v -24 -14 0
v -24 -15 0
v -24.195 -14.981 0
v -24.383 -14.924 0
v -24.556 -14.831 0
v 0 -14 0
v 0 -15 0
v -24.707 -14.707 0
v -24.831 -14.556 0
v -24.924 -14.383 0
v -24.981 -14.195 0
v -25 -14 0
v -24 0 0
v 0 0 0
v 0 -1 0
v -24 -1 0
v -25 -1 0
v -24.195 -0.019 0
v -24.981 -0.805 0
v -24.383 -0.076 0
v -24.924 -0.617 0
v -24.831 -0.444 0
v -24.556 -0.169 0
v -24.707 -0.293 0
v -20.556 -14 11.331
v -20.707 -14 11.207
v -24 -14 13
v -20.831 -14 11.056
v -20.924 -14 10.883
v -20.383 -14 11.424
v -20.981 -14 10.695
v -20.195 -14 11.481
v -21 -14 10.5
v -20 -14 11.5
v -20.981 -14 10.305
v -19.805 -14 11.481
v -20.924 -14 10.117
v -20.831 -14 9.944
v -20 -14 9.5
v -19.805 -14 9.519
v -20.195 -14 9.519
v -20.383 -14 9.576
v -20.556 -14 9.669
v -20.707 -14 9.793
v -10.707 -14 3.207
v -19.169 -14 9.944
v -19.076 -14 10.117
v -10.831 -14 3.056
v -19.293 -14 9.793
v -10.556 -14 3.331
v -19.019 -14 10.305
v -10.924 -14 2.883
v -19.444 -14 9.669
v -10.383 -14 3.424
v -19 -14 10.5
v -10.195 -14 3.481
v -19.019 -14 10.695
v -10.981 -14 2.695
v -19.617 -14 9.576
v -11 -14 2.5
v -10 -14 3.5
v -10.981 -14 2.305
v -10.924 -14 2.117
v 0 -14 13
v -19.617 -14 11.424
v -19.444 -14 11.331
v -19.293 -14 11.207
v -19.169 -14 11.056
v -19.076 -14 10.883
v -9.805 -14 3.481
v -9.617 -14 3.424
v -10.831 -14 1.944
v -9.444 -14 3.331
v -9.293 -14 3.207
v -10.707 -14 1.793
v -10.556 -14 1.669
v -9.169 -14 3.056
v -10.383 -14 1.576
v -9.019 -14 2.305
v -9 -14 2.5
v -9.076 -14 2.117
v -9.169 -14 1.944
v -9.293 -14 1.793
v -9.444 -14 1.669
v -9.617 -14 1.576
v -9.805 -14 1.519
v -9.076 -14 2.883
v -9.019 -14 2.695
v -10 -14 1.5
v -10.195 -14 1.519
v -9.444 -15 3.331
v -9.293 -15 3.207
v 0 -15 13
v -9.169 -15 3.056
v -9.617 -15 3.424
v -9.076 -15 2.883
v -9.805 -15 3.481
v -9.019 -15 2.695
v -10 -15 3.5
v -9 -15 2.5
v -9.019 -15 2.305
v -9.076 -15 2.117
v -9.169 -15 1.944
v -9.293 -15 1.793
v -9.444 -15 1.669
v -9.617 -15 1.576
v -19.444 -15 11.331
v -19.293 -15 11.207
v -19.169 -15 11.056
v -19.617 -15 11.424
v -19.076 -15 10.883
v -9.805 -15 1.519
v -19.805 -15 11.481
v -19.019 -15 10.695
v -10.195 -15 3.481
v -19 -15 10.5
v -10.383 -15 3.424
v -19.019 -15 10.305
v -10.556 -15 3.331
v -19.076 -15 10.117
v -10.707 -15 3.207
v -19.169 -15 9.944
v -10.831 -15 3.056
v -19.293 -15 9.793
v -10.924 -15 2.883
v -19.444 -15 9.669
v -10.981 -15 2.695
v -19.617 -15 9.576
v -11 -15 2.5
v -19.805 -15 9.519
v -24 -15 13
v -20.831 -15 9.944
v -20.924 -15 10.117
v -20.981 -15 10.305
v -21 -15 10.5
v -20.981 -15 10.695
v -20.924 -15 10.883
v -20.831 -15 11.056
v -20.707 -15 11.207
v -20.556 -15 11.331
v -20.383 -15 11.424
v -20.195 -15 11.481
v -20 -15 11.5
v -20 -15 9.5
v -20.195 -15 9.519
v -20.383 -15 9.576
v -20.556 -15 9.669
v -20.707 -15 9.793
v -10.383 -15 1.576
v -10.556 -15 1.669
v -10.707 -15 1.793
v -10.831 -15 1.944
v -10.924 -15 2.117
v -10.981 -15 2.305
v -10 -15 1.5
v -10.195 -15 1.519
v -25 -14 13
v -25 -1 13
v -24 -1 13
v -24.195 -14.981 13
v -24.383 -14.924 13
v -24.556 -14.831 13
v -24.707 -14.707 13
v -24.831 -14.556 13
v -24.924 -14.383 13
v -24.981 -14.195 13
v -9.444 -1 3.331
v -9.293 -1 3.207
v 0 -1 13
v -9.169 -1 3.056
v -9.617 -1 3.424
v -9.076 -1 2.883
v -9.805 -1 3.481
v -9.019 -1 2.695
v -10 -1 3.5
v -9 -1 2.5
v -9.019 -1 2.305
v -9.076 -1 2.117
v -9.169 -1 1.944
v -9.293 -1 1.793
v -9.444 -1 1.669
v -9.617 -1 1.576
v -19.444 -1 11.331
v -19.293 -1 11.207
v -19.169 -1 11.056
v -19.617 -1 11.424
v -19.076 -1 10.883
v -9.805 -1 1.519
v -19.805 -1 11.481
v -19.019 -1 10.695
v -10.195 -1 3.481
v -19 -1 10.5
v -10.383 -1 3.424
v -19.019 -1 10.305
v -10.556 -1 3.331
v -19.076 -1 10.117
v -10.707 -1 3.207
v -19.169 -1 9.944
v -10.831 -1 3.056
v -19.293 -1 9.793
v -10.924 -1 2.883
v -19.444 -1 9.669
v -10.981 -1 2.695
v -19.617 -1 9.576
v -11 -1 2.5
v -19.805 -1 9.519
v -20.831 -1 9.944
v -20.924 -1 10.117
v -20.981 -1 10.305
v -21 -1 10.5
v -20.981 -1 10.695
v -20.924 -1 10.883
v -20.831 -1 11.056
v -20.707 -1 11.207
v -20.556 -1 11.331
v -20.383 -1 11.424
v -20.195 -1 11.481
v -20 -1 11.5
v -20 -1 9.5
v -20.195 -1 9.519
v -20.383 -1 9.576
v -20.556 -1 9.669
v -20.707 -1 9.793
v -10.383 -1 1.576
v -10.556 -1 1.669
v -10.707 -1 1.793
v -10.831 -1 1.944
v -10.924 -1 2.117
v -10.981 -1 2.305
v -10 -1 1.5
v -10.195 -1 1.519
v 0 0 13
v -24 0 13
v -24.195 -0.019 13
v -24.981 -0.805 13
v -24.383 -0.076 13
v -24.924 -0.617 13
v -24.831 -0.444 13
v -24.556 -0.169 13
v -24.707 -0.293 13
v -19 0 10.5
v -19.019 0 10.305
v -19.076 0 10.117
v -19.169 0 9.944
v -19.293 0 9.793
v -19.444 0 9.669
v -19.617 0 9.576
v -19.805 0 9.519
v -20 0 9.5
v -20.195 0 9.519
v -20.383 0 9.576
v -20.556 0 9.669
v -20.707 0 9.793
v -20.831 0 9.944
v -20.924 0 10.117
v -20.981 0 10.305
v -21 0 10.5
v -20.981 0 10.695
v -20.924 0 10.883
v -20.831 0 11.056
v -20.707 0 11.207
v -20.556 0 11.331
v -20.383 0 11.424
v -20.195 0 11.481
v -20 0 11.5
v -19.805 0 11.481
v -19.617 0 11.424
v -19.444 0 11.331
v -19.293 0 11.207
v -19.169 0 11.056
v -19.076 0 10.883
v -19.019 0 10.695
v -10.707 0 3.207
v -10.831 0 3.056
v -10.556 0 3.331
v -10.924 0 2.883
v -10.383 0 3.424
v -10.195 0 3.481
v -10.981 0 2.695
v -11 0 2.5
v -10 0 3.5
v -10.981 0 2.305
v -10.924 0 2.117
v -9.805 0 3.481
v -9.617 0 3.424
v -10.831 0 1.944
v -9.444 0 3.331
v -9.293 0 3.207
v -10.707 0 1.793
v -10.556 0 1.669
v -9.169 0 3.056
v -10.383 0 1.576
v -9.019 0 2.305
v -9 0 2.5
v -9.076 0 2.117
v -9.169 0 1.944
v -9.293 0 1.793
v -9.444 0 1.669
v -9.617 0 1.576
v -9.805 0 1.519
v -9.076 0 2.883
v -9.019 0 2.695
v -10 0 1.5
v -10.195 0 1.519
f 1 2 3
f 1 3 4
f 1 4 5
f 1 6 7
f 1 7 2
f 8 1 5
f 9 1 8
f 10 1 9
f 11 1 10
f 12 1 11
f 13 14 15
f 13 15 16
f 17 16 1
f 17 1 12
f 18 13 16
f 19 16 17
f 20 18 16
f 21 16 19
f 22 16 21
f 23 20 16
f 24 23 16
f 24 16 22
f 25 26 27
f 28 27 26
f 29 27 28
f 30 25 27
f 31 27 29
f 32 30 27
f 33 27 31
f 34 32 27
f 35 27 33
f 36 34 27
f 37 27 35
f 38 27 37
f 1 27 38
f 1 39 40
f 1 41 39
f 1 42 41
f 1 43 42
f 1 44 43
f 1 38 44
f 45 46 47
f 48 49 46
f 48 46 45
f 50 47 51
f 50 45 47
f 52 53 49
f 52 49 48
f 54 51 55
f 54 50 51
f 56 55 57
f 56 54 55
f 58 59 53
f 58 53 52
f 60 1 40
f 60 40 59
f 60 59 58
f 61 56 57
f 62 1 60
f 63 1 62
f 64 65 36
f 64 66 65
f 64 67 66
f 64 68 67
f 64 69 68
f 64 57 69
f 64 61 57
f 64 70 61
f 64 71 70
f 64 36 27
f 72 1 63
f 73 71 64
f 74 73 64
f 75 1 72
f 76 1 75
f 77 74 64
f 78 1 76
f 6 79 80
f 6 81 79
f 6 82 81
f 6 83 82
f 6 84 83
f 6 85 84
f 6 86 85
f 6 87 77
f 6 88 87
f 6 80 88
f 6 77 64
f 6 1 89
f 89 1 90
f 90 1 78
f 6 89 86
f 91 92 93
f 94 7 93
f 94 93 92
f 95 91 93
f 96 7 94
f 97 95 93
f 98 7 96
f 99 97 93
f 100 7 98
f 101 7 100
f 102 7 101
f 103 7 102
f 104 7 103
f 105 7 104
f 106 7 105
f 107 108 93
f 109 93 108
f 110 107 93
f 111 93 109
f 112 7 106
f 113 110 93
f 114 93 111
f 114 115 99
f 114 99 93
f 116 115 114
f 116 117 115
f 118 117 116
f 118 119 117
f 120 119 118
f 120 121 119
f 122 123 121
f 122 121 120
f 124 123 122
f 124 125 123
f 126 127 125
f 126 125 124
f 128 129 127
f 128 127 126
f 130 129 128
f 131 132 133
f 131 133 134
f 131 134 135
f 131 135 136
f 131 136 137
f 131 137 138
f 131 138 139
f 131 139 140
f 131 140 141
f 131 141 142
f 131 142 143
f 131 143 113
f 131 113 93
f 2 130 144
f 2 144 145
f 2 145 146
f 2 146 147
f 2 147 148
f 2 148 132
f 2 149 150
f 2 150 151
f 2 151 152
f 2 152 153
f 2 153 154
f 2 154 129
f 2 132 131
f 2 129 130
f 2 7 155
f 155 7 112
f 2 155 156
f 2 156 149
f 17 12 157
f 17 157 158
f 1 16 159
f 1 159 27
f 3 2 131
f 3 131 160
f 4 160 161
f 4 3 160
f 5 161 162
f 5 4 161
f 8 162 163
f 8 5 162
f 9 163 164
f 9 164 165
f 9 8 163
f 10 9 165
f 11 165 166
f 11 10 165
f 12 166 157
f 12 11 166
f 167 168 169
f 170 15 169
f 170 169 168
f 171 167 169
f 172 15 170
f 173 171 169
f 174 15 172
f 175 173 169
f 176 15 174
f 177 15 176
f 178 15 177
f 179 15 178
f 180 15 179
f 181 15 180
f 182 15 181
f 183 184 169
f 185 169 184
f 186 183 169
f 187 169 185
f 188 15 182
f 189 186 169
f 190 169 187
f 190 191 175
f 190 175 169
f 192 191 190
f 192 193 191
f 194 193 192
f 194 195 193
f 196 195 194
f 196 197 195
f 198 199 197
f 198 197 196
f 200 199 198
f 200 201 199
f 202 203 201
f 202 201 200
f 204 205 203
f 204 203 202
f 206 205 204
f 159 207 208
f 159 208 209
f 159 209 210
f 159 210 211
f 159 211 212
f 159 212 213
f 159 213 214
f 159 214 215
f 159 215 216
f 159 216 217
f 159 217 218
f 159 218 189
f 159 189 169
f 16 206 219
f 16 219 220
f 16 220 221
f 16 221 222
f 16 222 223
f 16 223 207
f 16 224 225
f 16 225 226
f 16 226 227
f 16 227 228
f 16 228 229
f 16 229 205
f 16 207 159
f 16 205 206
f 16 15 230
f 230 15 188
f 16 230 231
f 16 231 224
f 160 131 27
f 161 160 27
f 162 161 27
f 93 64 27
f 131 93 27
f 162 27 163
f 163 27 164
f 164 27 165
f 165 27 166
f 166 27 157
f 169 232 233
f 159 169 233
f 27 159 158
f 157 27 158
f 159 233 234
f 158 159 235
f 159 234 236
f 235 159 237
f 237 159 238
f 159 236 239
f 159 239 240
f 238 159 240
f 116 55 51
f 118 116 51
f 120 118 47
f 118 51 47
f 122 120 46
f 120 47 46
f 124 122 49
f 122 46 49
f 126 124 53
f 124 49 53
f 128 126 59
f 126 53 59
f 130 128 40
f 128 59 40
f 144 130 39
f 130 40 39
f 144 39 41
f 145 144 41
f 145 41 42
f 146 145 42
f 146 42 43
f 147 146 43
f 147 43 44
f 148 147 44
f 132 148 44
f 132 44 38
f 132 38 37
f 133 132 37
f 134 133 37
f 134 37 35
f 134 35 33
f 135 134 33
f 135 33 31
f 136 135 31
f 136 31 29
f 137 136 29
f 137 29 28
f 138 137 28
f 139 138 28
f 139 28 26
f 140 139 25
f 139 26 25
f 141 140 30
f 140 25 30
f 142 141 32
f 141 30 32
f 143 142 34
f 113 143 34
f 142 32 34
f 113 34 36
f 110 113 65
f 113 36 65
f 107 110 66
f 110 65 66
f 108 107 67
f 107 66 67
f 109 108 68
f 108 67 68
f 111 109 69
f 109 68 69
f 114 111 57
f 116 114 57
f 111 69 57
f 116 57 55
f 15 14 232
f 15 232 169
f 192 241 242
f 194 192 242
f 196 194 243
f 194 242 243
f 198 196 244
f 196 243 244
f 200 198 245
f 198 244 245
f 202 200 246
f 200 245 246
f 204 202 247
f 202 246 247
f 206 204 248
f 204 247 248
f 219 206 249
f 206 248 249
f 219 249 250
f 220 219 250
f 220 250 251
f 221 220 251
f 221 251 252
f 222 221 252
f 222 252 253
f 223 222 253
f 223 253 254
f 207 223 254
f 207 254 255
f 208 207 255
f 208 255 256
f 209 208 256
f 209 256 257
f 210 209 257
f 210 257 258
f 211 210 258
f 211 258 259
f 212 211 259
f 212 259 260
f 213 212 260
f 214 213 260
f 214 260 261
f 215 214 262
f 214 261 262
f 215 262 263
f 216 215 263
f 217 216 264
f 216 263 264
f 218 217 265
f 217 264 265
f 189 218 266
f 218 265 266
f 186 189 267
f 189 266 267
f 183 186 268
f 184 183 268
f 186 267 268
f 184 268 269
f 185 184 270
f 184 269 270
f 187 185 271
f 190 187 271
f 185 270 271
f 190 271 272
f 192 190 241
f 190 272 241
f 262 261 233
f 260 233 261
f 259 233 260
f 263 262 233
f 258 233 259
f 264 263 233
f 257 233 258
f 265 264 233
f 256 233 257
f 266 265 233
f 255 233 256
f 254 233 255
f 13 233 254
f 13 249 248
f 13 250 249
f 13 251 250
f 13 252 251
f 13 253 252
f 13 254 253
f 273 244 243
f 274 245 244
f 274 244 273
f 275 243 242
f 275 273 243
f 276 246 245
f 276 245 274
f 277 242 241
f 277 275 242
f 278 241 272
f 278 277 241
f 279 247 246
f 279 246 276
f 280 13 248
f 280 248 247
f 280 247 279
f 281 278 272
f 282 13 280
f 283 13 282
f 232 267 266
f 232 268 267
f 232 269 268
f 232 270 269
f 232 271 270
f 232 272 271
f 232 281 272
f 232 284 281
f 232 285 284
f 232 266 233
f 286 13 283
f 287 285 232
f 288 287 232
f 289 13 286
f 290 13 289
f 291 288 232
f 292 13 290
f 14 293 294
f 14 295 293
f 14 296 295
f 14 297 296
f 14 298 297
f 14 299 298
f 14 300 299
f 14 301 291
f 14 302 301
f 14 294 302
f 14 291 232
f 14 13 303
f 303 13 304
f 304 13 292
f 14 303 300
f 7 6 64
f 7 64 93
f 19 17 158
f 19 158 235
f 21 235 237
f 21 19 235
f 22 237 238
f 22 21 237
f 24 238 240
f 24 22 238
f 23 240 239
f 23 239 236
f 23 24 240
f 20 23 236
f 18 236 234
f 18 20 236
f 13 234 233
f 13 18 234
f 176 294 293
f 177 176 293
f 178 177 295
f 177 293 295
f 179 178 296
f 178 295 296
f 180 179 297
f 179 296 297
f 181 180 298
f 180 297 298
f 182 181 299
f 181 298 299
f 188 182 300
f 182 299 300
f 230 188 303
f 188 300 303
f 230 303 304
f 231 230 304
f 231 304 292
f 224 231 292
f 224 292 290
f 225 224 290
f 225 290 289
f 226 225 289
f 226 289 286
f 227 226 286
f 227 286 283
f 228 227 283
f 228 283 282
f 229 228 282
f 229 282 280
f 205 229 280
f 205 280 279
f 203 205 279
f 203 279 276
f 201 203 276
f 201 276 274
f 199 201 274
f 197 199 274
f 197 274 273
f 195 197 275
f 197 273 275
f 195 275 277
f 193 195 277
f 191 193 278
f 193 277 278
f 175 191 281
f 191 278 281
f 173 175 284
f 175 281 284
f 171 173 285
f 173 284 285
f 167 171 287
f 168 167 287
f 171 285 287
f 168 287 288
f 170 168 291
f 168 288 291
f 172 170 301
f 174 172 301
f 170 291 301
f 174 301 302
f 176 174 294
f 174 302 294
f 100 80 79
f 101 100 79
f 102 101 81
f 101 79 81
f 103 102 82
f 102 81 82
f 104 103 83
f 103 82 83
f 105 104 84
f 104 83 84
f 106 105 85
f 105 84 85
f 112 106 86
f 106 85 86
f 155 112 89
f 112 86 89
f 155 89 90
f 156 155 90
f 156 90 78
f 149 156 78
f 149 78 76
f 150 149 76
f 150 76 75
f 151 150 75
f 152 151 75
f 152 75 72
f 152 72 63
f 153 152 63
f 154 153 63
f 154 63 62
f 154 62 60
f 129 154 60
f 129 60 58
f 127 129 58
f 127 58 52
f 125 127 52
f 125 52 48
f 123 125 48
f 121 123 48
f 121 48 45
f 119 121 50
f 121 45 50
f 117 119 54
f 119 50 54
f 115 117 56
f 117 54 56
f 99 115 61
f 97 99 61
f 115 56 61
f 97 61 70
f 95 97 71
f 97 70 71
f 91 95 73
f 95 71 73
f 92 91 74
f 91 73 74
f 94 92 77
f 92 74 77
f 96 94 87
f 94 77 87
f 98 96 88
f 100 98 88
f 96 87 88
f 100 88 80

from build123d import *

# Parameters (mm, degrees)
BOSS_EXTRUDE1_DEPTH     = 13
SKETCH3_R               = 1
CUT_EXTRUDE1_DEPTH      = 1
CUT_EXTRUDE1_DEPTH_BACK = 16
SKETCH3_4_R             = 1
CUT_EXTRUDE2_DEPTH      = 1
CUT_EXTRUDE2_DEPTH_BACK = 16


with BuildPart() as part:
    # Sketch2 → Boss-Extrude1 (new body)
    with BuildSketch(Plane.XY):
        with BuildLine():
            ThreePointArc((-24, -15), (-24.707106781, -14.707106781), (-25, -14))
            Line((-25, -14), (-25, -1))
            ThreePointArc((-25, -1), (-24.707106781, -0.292893219), (-24, 0))
            Line((-24, 0), (0, 0))
            Line((0, 0), (0, -1))
            Line((0, -1), (-24, -1))
            Line((-24, -1), (-24, -14))
            Line((-24, -14), (0, -14))
            Line((0, -14), (0, -15))
            Line((0, -15), (-24, -15))
        make_face()
    extrude(amount=BOSS_EXTRUDE1_DEPTH)

    # Sketch3 → Cut-Extrude1 (cut, two sides)
    with BuildSketch(Plane(origin=(0, 0, 0), x_dir=(1, 0, 0), z_dir=(0, 1, 0))) as cut_extrude1_sk:
        with Locations((-10, -2.5)):
            Circle(SKETCH3_R)
    extrude(amount=CUT_EXTRUDE1_DEPTH, mode=Mode.SUBTRACT)
    extrude(cut_extrude1_sk.sketch, amount=-CUT_EXTRUDE1_DEPTH_BACK, mode=Mode.SUBTRACT)

    # Sketch3<4> → Cut-Extrude2 (cut, two sides)
    with BuildSketch(Plane(origin=(0, 0, 0), x_dir=(1, 0, 0), z_dir=(0, 1, 0))) as cut_extrude2_sk:
        with Locations((-10, -2.5)):
            Circle(SKETCH3_4_R)
        with Locations((-20, -10.5)):
            Circle(SKETCH3_4_R)
    extrude(amount=CUT_EXTRUDE2_DEPTH, mode=Mode.SUBTRACT)
    extrude(cut_extrude2_sk.sketch, amount=-CUT_EXTRUDE2_DEPTH_BACK, mode=Mode.SUBTRACT)


solid = part.part
